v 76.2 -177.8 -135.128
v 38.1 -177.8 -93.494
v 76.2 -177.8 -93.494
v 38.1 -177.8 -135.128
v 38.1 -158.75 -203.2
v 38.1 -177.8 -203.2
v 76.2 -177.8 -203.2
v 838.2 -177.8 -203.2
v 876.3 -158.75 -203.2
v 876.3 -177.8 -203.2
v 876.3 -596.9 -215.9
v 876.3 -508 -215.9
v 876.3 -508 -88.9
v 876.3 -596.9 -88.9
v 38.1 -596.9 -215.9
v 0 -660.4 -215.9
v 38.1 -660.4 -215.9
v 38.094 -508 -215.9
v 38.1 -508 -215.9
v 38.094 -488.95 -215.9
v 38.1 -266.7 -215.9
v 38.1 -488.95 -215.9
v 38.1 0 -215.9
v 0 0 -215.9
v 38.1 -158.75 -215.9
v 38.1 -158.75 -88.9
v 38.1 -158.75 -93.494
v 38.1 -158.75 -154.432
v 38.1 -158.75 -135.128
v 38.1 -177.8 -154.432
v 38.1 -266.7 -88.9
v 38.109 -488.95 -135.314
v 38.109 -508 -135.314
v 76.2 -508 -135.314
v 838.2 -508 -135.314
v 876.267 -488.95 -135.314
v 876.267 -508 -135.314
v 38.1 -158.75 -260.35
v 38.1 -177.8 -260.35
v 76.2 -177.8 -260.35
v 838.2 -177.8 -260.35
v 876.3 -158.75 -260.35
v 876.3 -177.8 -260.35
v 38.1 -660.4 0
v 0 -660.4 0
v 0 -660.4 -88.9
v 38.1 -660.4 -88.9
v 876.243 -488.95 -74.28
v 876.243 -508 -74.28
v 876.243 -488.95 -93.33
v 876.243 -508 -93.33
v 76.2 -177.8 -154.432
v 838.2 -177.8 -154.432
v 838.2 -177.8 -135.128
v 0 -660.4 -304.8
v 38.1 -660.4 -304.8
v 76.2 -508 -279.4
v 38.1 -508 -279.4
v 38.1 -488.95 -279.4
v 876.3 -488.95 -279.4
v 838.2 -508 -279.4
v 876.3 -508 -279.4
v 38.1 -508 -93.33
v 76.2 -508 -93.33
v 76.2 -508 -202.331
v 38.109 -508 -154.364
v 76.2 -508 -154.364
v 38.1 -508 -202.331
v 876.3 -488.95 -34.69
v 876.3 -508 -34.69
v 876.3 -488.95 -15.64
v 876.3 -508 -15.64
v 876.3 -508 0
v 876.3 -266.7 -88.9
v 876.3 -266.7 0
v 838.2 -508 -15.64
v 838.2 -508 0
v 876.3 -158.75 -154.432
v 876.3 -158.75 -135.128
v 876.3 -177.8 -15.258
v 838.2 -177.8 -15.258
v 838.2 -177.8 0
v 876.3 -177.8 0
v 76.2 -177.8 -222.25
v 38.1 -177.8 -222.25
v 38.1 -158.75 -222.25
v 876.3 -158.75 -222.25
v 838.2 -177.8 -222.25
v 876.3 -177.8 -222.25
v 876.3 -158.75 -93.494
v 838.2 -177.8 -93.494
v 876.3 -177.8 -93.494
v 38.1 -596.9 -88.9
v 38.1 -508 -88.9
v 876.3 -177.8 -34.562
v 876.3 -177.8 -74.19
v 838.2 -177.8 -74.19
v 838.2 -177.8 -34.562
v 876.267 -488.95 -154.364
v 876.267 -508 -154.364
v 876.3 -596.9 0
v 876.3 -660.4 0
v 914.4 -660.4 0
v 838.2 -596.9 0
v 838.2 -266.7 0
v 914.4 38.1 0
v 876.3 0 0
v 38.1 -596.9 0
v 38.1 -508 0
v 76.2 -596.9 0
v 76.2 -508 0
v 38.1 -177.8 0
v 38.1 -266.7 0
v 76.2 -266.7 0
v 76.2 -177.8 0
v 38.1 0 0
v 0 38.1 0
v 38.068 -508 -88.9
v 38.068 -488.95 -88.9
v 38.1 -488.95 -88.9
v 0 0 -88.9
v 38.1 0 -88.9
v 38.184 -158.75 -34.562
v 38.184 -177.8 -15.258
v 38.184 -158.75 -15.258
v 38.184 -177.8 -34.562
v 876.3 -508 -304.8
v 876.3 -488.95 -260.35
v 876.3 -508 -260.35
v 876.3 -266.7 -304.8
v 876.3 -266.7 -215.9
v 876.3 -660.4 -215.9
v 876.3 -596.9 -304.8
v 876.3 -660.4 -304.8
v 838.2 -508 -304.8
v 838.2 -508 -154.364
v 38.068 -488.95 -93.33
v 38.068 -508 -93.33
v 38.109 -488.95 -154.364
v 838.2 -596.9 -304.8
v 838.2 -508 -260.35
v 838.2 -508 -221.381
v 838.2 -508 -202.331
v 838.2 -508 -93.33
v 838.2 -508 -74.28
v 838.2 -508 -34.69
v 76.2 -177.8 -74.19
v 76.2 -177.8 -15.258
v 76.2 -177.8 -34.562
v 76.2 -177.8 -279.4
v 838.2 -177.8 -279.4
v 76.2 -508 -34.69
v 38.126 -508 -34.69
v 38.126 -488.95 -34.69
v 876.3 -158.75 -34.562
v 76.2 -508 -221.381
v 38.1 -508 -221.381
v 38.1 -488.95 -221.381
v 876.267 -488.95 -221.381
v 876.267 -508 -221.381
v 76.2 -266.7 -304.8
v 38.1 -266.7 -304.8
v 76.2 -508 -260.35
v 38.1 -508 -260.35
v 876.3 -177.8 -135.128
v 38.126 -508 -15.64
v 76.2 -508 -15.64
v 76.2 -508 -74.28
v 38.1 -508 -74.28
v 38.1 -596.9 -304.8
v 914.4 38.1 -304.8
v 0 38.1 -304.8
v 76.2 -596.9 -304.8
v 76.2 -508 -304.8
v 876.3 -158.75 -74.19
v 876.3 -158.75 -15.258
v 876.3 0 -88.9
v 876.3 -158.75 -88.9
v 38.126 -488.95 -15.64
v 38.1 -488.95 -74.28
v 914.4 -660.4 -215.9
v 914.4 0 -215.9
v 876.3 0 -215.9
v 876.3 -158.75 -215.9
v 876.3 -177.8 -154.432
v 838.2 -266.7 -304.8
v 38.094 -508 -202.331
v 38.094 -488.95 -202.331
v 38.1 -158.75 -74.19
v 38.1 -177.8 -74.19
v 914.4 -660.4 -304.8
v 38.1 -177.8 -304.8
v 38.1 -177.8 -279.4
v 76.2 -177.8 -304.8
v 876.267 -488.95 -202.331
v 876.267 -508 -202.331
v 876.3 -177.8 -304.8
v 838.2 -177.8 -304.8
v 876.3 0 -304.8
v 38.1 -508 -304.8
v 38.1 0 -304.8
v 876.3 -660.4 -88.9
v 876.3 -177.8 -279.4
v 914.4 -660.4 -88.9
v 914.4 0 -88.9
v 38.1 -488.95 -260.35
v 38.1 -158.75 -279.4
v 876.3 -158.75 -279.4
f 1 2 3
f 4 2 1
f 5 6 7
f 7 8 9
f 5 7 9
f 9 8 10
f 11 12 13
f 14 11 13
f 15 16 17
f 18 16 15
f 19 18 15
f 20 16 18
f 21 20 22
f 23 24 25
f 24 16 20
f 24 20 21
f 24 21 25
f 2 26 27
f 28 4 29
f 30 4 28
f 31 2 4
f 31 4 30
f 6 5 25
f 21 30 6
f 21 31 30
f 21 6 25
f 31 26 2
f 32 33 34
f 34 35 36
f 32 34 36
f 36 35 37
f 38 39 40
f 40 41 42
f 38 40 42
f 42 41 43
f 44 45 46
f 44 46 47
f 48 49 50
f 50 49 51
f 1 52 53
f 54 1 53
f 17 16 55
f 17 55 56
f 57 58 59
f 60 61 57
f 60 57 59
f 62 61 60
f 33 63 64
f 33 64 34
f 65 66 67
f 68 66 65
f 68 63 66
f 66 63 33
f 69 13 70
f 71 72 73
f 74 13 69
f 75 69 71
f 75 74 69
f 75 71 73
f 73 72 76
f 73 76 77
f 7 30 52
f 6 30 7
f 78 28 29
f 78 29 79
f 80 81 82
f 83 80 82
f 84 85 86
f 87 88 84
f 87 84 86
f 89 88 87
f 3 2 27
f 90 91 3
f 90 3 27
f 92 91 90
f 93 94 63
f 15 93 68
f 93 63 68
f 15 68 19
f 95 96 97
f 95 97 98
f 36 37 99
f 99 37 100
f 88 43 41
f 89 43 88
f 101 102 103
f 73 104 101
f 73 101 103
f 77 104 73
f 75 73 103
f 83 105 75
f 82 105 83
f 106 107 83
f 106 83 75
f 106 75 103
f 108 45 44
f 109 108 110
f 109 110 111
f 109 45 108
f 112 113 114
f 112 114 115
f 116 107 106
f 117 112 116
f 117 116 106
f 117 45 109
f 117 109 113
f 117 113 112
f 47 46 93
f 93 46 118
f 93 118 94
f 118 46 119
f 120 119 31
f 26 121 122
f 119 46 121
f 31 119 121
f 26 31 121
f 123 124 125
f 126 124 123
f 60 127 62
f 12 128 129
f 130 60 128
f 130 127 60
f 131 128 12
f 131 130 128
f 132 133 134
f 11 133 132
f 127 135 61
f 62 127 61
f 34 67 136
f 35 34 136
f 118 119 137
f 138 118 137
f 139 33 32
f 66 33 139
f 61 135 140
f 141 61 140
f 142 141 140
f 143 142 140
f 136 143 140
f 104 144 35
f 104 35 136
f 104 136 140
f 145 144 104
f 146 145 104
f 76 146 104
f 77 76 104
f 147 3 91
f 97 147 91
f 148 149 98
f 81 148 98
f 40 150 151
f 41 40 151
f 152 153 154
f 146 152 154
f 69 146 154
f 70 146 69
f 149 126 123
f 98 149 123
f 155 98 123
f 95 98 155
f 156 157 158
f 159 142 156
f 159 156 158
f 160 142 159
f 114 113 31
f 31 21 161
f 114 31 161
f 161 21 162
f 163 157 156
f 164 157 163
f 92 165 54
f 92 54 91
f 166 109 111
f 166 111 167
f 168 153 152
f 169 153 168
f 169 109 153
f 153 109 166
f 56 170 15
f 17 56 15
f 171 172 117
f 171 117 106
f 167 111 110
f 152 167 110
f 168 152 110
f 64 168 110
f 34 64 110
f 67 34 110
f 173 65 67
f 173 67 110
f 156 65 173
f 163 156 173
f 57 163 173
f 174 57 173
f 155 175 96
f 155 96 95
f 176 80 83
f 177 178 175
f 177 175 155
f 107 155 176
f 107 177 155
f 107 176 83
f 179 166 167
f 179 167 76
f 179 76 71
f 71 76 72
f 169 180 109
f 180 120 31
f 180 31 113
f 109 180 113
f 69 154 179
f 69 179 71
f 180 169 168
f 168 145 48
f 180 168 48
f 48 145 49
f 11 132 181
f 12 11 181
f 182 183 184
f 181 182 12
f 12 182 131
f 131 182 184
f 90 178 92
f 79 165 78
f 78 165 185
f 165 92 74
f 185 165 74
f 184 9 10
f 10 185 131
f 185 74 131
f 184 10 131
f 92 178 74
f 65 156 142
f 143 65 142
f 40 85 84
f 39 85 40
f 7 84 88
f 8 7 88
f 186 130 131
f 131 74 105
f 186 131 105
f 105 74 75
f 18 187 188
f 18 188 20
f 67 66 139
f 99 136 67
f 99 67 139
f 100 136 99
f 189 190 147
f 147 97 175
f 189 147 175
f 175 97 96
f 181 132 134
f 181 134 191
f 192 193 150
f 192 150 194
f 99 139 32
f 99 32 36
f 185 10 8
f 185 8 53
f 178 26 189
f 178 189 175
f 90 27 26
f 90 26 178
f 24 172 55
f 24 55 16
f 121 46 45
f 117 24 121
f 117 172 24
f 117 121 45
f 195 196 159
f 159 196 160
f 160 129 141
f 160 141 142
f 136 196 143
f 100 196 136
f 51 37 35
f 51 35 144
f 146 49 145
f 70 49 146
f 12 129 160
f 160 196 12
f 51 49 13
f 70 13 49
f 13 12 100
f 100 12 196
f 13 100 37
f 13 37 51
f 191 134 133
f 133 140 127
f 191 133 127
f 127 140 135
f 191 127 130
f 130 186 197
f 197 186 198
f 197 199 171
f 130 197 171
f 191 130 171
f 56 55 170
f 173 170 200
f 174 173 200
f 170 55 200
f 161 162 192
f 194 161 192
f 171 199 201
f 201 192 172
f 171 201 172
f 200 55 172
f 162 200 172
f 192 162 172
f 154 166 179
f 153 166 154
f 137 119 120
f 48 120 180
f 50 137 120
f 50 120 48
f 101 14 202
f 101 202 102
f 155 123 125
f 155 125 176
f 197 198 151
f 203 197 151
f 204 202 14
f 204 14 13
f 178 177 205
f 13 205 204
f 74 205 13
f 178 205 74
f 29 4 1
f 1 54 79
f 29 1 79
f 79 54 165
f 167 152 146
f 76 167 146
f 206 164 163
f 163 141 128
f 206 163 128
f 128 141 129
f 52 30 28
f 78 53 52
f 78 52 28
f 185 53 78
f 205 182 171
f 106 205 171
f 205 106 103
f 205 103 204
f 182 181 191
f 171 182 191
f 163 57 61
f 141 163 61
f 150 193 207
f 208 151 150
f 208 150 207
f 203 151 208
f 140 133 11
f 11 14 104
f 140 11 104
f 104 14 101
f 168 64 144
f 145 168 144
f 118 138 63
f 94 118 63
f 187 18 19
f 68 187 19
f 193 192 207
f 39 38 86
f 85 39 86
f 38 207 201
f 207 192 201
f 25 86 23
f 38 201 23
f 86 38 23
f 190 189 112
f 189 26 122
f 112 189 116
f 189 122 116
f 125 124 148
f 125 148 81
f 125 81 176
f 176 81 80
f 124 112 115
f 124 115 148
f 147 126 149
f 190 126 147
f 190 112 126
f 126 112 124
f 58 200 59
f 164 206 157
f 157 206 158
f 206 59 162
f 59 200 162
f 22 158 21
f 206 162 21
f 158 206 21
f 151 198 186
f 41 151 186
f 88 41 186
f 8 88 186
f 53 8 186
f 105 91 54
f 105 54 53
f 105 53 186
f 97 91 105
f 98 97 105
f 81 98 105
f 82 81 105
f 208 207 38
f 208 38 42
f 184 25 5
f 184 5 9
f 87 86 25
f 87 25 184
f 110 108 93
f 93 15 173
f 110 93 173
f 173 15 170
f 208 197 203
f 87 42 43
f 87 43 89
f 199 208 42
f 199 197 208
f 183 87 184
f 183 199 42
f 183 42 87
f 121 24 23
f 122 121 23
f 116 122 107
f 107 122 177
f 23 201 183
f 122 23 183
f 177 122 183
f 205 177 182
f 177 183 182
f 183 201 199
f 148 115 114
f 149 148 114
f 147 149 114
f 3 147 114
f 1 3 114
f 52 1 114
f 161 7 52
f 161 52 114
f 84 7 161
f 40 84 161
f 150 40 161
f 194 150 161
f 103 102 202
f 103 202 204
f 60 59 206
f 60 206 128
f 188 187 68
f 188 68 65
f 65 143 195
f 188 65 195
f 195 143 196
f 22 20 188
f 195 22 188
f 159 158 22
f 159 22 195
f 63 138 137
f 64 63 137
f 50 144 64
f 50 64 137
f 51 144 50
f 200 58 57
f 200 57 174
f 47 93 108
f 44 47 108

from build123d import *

# Parameters (mm, degrees)
SKETCH1_W            = 914.4
SKETCH1_H            = 304.8
BOSS_EXTRUDE3_DEPTH  = 38.1
SKETCH5_W            = 38.1
SKETCH5_H            = 88.9
BOSS_EXTRUDE4_DEPTH  = 660.4
SKETCH7_W            = 304.8
SKETCH7_H            = 88.9
BOSS_EXTRUDE5_DEPTH  = 38.1
SKETCH6_W            = 304.8
SKETCH6_H            = 88.9
BOSS_EXTRUDE6_DEPTH  = 38.1
SKETCH9_W            = 304.8
SKETCH9_H            = 88.9
BOSS_EXTRUDE7_DEPTH  = 38.1
SKETCH8_W            = 304.8
SKETCH8_H            = 88.9
BOSS_EXTRUDE8_DEPTH  = 38.1
SKETCH10_W           = 838.2
SKETCH10_H           = 19.05
SKETCH10_W_2         = 838.173774045
SKETCH10_W_3         = 838.158204612
SKETCH10_W_4         = 838.175626617
SKETCH10_W_5         = 838.17389523
BOSS_EXTRUDE9_DEPTH  = 19.05
SKETCH11_W           = 838.2
SKETCH11_H           = 19.05
SKETCH11_H_2         = 19.304
BOSS_EXTRUDE10_DEPTH = 19.05


with BuildPart() as part:
    # Sketch1 → Boss-Extrude3 (new body)
    with BuildSketch(Plane(origin=(0, 0, 0), x_dir=(1, 0, 0), z_dir=(0, 1, 0))):
        with Locations((457.2, 152.4)):
            Rectangle(SKETCH1_W, SKETCH1_H)
    extrude(amount=BOSS_EXTRUDE3_DEPTH)

    # Sketch5 → Boss-Extrude4 (add)
    with BuildSketch(Plane.XZ):
        with Locations((19.05, -44.45)):
            Rectangle(SKETCH5_W, SKETCH5_H)
        with Locations((19.05, -260.35)):
            Rectangle(SKETCH5_W, SKETCH5_H)
        with Locations((895.35, -44.45)):
            Rectangle(SKETCH5_W, SKETCH5_H)
        with Locations((895.35, -260.35)):
            Rectangle(SKETCH5_W, SKETCH5_H)
    extrude(amount=BOSS_EXTRUDE4_DEPTH)

    # Sketch7 → Boss-Extrude5 (add)
    with BuildSketch(Plane(origin=(38.1, 0, 0), x_dir=(0, 0, -1), z_dir=(1, 0, 0))):
        with Locations((152.4, -222.25)):
            Rectangle(SKETCH7_W, SKETCH7_H)
    extrude(amount=BOSS_EXTRUDE5_DEPTH)

    # Sketch6 → Boss-Extrude6 (add)
    with BuildSketch(Plane.ZY.offset(-876.3)):
        with Locations((-152.4, -222.25)):
            Rectangle(SKETCH6_W, SKETCH6_H)
    extrude(amount=BOSS_EXTRUDE6_DEPTH)

    # Sketch9 → Boss-Extrude7 (add)
    with BuildSketch(Plane.ZY.offset(-876.3)):
        with Locations((-152.4, -552.45)):
            Rectangle(SKETCH9_W, SKETCH9_H)
    extrude(amount=BOSS_EXTRUDE7_DEPTH)

    # Sketch8 → Boss-Extrude8 (add)
    with BuildSketch(Plane(origin=(38.1, 0, 0), x_dir=(0, 0, -1), z_dir=(1, 0, 0))):
        with Locations((152.4, -552.45)):
            Rectangle(SKETCH8_W, SKETCH8_H)
    extrude(amount=BOSS_EXTRUDE8_DEPTH)

    # Sketch10 → Boss-Extrude9 (add)
    with BuildSketch(Plane(origin=(0, -508, 0), x_dir=(1, 0, 0), z_dir=(0, 1, 0))):
        with Locations((457.2, 269.875)):
            Rectangle(SKETCH10_W, SKETCH10_H)
        with Locations((457.180463347, 211.855946701)):
            Rectangle(SKETCH10_W_2, SKETCH10_H)
        with Locations((457.188248064, 144.838690295)):
            Rectangle(SKETCH10_W_3, SKETCH10_H)
        with Locations((457.155340061, 83.805117496)):
            Rectangle(SKETCH10_W_4, SKETCH10_H)
        with Locations((457.213052385, 25.16501814)):
            Rectangle(SKETCH10_W_5, SKETCH10_H)
    extrude(amount=BOSS_EXTRUDE9_DEPTH)

    # Sketch11 → Boss-Extrude10 (add)
    with BuildSketch(Plane(origin=(0, -177.8, 0), x_dir=(1, 0, 0), z_dir=(0, 1, 0))):
        with Locations((457.2, 269.875)):
            Rectangle(SKETCH11_W, SKETCH11_H)
        with Locations((457.2, 212.725)):
            Rectangle(SKETCH11_W, SKETCH11_H)
        with Locations((457.2, 144.78)):
            Rectangle(SKETCH11_W, SKETCH11_H_2)
        with Locations((457.2, 83.841878729)):
            Rectangle(SKETCH11_W, SKETCH11_H_2)
        with Locations((457.283867399, 24.910423168)):
            Rectangle(SKETCH11_W, SKETCH11_H_2)
    extrude(amount=BOSS_EXTRUDE10_DEPTH)


solid = part.part
